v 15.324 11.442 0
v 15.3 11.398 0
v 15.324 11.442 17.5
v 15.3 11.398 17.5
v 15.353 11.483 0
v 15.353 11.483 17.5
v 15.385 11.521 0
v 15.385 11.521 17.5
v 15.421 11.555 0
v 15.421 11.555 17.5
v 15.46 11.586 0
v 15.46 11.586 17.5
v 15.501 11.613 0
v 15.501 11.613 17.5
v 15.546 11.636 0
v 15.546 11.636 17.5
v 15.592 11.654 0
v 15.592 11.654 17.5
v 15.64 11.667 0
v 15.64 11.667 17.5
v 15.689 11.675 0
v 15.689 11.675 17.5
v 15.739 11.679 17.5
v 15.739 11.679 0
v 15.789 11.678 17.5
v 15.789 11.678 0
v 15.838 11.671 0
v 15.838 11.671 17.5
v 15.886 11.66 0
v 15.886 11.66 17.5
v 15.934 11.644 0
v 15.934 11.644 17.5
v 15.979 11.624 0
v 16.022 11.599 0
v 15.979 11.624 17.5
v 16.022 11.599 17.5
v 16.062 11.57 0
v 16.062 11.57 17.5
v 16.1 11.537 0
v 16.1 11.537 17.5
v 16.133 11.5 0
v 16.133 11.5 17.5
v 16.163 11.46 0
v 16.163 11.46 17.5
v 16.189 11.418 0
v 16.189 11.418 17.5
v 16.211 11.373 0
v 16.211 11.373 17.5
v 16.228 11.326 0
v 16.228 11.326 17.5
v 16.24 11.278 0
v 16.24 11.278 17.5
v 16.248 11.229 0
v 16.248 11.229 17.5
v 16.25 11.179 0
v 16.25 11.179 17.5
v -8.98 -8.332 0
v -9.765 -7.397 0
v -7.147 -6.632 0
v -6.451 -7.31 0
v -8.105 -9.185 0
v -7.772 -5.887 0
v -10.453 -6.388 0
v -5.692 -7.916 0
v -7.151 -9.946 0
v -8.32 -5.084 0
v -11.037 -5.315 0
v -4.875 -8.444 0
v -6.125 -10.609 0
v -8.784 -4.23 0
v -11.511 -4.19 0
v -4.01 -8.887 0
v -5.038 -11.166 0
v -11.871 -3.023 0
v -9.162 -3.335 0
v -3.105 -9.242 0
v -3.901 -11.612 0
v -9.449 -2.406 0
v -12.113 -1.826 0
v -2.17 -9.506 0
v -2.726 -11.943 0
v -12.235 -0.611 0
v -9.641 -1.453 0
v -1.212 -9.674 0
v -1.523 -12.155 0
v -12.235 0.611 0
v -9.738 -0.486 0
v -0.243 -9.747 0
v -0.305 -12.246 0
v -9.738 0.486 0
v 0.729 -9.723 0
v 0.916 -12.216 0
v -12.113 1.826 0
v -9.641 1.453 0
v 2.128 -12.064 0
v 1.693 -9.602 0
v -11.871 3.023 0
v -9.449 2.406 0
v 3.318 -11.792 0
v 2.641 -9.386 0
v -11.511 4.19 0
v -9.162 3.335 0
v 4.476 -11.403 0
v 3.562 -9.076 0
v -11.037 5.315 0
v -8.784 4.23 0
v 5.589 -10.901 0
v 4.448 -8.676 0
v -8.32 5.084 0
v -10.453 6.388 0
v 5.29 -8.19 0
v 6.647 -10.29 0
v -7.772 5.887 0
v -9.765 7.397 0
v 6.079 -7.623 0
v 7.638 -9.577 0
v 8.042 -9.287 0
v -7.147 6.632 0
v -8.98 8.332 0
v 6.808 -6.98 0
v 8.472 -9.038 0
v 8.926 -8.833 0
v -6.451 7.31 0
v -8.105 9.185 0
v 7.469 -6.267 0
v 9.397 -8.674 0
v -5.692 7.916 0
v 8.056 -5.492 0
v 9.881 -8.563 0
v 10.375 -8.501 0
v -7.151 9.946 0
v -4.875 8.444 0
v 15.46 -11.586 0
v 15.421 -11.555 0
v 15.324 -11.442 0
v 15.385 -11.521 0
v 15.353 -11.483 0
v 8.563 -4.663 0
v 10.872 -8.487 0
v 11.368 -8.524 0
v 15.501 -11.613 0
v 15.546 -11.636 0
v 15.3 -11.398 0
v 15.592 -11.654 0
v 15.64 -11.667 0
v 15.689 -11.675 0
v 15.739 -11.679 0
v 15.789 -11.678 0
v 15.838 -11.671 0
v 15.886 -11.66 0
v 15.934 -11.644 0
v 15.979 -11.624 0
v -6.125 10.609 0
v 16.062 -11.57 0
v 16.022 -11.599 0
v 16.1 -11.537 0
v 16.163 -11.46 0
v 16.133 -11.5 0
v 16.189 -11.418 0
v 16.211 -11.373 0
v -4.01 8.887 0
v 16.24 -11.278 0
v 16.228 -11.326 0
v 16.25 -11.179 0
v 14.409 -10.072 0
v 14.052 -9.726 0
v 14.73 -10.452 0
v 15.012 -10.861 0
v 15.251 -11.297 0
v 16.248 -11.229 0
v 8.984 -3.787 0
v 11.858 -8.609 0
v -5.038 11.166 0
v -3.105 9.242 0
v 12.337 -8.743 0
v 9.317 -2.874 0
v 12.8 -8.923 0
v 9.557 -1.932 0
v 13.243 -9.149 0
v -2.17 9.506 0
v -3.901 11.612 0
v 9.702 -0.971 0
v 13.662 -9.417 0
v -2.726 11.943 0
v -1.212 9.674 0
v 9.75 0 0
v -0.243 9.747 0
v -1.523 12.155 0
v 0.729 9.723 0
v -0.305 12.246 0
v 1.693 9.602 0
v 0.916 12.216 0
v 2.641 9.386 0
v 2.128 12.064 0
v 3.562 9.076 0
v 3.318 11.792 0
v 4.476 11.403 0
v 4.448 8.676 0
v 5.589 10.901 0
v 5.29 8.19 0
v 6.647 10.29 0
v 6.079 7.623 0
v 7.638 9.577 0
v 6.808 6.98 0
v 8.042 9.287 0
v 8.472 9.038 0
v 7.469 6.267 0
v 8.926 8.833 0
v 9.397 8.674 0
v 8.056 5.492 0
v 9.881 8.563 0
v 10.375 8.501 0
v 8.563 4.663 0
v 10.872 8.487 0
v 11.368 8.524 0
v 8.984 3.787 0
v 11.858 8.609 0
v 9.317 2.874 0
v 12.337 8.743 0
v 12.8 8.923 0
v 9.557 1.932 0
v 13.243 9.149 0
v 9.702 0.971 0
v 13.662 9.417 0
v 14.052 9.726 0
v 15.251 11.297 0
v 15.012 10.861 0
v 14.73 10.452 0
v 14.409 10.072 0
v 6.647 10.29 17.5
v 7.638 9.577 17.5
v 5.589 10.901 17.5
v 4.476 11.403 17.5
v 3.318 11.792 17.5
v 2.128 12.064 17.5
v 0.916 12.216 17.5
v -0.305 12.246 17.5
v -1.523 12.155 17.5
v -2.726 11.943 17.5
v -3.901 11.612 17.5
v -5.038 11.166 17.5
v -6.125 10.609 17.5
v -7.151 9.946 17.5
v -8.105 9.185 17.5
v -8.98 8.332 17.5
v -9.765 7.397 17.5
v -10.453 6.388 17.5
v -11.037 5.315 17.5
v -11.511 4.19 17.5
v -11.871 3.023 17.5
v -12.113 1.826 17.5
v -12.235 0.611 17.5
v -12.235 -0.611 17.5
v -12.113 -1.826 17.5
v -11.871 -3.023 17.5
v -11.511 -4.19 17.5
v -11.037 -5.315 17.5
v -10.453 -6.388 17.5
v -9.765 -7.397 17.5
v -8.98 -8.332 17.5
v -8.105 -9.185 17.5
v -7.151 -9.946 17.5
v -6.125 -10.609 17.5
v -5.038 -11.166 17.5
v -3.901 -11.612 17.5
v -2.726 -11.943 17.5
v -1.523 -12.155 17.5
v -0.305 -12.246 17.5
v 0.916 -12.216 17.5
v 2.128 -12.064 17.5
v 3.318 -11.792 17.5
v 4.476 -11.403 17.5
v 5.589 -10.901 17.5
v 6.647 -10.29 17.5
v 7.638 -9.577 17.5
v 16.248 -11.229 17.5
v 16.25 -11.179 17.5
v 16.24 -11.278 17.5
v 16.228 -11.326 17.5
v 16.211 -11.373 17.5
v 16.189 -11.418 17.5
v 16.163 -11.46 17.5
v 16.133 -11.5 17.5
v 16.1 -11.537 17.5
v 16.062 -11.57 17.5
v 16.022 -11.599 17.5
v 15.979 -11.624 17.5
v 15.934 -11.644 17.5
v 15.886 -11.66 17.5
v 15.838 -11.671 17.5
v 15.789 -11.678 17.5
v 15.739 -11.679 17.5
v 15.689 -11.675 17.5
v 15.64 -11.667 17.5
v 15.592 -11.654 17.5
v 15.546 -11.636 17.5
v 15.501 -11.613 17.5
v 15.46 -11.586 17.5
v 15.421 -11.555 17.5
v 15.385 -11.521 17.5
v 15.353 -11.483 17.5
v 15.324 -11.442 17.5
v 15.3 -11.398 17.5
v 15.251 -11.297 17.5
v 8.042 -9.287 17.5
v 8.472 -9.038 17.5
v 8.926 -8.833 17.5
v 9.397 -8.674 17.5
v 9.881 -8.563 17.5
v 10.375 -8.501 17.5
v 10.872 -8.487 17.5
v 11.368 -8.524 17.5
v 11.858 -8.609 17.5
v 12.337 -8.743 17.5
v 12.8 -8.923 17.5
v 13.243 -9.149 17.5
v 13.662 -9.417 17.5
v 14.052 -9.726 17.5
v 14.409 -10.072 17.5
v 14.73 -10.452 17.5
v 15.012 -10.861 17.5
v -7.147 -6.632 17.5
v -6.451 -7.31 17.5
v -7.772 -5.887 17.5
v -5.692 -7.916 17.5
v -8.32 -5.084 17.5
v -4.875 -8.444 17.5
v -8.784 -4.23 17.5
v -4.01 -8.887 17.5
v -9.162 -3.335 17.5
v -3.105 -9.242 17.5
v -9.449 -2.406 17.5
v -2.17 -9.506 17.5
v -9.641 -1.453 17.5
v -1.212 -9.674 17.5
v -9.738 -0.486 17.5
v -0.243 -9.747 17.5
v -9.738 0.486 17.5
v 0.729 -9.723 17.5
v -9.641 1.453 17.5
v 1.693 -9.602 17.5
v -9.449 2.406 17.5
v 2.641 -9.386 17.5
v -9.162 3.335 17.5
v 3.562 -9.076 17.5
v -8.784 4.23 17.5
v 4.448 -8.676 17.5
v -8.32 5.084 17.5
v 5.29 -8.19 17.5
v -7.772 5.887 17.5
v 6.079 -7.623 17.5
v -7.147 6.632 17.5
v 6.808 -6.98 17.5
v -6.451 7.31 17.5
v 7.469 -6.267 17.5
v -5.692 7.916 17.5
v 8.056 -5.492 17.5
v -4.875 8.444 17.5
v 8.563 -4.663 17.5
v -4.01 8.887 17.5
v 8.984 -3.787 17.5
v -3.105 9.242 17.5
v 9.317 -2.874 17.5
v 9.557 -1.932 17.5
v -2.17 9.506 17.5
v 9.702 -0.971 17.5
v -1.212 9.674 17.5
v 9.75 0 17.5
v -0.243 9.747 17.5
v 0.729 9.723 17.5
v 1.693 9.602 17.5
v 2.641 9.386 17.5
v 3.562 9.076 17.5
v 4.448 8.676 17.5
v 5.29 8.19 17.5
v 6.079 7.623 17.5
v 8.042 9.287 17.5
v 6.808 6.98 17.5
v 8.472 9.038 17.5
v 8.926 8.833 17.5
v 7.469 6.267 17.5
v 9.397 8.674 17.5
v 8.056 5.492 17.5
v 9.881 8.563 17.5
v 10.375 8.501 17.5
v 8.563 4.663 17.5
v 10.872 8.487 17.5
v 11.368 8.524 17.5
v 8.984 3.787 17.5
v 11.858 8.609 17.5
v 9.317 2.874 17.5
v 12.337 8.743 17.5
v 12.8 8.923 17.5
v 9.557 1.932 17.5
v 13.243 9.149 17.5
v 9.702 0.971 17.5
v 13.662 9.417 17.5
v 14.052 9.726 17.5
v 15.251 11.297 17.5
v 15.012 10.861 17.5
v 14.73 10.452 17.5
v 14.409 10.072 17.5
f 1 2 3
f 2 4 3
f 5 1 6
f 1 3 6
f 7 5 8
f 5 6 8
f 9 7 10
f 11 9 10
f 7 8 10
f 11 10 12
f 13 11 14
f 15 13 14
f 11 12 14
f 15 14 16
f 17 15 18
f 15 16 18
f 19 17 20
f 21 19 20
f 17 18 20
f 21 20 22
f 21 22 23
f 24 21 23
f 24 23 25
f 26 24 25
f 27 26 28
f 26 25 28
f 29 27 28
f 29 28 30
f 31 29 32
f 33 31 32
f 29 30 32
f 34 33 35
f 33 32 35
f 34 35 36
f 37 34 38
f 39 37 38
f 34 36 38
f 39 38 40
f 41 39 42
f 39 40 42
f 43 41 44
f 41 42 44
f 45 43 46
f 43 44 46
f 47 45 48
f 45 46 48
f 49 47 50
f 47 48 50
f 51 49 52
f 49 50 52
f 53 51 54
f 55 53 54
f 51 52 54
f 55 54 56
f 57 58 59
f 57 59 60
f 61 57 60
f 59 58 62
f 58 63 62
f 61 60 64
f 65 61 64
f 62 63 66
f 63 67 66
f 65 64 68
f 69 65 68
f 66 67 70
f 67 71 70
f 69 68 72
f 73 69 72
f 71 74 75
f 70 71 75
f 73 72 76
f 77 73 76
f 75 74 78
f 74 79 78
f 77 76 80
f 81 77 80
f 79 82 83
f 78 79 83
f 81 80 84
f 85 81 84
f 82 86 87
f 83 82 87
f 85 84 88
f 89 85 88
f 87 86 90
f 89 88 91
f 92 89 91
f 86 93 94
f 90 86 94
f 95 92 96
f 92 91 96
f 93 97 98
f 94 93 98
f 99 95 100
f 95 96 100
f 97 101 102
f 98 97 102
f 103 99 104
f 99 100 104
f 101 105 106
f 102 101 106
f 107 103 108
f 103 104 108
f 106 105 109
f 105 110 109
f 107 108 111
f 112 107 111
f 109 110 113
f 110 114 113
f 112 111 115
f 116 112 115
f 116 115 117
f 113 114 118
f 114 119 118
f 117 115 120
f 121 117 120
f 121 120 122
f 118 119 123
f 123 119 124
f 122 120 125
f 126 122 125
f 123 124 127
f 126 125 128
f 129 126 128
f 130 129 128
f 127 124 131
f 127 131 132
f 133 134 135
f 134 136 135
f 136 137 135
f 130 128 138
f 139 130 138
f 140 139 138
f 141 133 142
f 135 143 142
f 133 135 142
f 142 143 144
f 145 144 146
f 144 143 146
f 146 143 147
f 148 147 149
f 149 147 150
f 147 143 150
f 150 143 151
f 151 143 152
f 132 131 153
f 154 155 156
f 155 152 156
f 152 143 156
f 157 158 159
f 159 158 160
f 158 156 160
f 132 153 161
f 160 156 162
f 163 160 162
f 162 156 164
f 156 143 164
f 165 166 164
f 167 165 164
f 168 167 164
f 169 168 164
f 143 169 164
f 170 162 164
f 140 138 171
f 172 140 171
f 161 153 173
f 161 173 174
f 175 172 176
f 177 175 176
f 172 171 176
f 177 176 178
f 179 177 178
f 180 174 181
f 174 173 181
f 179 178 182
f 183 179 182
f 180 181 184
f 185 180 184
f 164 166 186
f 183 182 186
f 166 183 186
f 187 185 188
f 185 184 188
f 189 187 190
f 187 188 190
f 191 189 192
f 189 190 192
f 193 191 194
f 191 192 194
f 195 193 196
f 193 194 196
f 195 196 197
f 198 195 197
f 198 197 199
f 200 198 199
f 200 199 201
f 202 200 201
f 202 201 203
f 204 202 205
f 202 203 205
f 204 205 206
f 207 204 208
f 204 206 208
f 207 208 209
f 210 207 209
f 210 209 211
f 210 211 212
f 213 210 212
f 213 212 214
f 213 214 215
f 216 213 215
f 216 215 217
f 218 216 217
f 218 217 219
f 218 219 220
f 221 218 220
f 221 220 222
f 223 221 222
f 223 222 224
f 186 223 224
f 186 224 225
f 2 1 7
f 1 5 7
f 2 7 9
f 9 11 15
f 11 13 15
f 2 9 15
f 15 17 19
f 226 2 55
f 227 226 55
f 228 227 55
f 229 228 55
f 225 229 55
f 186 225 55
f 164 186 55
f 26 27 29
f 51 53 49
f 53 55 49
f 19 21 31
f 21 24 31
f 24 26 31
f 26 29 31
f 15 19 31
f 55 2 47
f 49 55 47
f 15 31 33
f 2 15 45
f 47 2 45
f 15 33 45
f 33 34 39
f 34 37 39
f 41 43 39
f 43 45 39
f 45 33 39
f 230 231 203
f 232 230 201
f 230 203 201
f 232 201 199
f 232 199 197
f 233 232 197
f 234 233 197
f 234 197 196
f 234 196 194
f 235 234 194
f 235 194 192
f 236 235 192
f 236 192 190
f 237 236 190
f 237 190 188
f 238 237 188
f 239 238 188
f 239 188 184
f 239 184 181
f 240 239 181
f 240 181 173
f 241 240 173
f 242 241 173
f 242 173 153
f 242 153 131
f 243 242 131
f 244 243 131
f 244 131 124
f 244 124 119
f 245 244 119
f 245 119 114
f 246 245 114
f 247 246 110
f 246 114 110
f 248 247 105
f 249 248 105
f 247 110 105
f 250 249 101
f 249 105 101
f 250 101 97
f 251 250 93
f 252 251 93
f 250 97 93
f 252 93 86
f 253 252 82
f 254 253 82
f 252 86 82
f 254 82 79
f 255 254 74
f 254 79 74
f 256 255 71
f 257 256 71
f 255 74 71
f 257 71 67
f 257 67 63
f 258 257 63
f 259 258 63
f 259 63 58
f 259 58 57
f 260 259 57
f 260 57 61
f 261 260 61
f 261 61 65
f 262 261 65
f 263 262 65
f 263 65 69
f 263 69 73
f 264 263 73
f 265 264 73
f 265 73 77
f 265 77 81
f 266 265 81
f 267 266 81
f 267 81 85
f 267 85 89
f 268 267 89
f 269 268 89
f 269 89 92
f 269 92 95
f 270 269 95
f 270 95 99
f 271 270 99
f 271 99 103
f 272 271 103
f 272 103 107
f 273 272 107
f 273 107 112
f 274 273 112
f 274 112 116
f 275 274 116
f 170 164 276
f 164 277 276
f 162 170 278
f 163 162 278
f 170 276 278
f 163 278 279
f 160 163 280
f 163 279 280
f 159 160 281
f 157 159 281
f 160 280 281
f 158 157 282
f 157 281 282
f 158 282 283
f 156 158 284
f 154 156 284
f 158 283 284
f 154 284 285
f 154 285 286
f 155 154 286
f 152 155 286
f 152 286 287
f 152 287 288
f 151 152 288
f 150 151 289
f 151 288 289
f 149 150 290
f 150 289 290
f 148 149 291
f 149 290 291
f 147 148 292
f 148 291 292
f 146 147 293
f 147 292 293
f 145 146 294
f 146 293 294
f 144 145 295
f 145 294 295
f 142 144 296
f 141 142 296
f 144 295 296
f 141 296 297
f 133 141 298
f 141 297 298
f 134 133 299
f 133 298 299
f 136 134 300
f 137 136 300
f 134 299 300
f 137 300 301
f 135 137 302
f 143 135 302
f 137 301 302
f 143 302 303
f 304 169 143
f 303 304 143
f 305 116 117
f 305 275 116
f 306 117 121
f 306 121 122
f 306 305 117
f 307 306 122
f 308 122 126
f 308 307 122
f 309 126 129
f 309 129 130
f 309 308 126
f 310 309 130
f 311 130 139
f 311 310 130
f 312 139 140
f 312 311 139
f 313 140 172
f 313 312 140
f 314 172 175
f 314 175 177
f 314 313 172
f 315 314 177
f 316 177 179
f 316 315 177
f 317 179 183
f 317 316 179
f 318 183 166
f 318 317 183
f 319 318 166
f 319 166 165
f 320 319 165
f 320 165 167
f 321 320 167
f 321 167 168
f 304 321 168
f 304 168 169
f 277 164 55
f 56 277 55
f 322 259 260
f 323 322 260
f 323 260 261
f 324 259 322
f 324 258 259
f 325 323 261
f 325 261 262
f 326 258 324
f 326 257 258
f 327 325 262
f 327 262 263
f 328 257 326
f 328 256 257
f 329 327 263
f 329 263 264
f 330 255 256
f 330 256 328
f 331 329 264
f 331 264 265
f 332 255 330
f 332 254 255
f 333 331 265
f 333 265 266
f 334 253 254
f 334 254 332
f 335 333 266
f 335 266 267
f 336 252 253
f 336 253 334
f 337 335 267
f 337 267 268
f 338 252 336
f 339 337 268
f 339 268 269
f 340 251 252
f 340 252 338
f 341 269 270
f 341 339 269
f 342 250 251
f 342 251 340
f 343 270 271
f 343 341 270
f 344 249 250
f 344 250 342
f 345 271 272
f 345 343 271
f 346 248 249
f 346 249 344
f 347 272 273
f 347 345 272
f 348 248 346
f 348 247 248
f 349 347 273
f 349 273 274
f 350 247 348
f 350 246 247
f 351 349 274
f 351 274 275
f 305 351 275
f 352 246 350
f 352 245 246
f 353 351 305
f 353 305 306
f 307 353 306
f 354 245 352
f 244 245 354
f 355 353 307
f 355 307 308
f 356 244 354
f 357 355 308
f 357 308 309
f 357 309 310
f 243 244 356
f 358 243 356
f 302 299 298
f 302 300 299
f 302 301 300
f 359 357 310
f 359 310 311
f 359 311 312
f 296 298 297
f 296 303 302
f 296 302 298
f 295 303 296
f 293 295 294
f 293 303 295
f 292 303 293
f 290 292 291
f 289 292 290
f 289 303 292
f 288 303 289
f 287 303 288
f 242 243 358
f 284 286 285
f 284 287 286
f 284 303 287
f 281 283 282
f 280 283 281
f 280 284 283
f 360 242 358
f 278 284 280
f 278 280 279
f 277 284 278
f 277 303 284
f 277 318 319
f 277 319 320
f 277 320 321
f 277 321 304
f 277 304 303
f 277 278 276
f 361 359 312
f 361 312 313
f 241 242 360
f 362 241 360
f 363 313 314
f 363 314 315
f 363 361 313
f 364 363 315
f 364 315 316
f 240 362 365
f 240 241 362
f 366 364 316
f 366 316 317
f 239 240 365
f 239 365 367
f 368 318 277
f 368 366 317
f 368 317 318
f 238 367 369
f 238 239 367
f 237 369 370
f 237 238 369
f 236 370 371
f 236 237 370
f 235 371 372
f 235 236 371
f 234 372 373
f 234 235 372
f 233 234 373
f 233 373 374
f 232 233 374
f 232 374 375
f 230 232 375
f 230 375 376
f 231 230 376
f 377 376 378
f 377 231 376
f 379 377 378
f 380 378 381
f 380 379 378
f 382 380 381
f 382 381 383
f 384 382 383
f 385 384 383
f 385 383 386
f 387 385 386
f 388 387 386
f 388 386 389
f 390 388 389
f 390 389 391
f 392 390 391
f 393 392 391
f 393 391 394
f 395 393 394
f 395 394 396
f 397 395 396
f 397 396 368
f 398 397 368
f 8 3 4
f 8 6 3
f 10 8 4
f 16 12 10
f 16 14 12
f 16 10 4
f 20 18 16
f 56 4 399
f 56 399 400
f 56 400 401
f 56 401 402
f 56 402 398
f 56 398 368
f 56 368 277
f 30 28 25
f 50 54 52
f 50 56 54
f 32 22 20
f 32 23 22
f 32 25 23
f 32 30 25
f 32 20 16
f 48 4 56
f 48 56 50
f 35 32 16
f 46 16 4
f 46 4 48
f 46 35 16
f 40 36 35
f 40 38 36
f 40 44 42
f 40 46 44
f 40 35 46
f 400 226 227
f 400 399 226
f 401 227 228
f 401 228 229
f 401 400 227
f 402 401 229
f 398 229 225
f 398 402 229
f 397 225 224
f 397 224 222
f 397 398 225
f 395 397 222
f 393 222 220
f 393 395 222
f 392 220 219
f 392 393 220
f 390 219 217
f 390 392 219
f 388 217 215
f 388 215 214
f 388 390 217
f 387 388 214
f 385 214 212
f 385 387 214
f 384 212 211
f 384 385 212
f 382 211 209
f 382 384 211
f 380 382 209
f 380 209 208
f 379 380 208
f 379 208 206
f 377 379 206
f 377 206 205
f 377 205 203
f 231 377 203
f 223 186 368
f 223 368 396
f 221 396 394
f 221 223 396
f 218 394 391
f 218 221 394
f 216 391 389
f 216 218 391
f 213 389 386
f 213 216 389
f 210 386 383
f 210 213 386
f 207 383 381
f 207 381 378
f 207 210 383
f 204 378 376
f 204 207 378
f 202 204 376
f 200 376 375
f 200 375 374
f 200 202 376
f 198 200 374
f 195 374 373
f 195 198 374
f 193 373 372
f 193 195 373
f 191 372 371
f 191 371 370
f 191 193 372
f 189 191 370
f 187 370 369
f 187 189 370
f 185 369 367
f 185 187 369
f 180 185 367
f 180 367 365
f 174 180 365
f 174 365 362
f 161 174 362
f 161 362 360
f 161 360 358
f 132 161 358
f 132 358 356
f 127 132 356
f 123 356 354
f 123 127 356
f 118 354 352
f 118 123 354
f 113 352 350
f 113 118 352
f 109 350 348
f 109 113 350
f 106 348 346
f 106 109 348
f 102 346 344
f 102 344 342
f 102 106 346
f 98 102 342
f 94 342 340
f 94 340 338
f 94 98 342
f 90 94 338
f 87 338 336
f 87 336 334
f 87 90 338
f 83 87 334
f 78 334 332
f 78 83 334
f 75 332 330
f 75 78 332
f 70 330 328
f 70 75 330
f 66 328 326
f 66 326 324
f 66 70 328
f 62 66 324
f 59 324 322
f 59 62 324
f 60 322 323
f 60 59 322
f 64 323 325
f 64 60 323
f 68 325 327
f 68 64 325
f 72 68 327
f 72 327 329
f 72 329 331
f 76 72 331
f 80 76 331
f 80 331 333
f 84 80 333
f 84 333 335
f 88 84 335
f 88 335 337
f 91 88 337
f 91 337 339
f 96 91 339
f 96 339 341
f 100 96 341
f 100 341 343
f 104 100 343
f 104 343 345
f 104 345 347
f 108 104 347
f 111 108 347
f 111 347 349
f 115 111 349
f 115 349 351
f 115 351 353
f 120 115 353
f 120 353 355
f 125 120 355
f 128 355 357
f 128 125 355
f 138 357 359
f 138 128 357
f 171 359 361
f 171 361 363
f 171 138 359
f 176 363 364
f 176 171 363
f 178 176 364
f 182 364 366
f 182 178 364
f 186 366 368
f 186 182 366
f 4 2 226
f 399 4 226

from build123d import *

# Parameters (mm, degrees)
F0_R     = 9.75
F1_DEPTH = 17.5
F2_R     = 5
F3_R     = 0.5


with BuildPart() as f1:
    # F0 (on Top) → F1 (new body)
    with BuildSketch(Plane.XY):
        with BuildLine():
            Line((16.25, 13.347993), (11.627468, 3.85545))
            ThreePointArc((11.627468, 3.85545), (-12.25, 0), (11.627468, -3.85545))
            Line((11.627468, -3.85545), (16.25, -13.347993))
            Line((16.25, -13.347993), (16.25, 13.347993))
        make_face()
        Circle(F0_R, mode=Mode.SUBTRACT)
    extrude(amount=F1_DEPTH)

    # F2
    f2_edges = [f1.edges().sort_by_distance(p)[0] for p in [
        (11.627468, -3.85545, 8.75),
        (11.627468, 3.85545, 8.75),
    ]]
    fillet(f2_edges, radius=F2_R)

    # F3
    f3_edges = [f1.edges().sort_by_distance(p)[0] for p in [
        (16.25, 13.347993, 8.75),
        (16.25, -13.347993, 8.75),
    ]]
    fillet(f3_edges, radius=F3_R)


solid = f1.part
